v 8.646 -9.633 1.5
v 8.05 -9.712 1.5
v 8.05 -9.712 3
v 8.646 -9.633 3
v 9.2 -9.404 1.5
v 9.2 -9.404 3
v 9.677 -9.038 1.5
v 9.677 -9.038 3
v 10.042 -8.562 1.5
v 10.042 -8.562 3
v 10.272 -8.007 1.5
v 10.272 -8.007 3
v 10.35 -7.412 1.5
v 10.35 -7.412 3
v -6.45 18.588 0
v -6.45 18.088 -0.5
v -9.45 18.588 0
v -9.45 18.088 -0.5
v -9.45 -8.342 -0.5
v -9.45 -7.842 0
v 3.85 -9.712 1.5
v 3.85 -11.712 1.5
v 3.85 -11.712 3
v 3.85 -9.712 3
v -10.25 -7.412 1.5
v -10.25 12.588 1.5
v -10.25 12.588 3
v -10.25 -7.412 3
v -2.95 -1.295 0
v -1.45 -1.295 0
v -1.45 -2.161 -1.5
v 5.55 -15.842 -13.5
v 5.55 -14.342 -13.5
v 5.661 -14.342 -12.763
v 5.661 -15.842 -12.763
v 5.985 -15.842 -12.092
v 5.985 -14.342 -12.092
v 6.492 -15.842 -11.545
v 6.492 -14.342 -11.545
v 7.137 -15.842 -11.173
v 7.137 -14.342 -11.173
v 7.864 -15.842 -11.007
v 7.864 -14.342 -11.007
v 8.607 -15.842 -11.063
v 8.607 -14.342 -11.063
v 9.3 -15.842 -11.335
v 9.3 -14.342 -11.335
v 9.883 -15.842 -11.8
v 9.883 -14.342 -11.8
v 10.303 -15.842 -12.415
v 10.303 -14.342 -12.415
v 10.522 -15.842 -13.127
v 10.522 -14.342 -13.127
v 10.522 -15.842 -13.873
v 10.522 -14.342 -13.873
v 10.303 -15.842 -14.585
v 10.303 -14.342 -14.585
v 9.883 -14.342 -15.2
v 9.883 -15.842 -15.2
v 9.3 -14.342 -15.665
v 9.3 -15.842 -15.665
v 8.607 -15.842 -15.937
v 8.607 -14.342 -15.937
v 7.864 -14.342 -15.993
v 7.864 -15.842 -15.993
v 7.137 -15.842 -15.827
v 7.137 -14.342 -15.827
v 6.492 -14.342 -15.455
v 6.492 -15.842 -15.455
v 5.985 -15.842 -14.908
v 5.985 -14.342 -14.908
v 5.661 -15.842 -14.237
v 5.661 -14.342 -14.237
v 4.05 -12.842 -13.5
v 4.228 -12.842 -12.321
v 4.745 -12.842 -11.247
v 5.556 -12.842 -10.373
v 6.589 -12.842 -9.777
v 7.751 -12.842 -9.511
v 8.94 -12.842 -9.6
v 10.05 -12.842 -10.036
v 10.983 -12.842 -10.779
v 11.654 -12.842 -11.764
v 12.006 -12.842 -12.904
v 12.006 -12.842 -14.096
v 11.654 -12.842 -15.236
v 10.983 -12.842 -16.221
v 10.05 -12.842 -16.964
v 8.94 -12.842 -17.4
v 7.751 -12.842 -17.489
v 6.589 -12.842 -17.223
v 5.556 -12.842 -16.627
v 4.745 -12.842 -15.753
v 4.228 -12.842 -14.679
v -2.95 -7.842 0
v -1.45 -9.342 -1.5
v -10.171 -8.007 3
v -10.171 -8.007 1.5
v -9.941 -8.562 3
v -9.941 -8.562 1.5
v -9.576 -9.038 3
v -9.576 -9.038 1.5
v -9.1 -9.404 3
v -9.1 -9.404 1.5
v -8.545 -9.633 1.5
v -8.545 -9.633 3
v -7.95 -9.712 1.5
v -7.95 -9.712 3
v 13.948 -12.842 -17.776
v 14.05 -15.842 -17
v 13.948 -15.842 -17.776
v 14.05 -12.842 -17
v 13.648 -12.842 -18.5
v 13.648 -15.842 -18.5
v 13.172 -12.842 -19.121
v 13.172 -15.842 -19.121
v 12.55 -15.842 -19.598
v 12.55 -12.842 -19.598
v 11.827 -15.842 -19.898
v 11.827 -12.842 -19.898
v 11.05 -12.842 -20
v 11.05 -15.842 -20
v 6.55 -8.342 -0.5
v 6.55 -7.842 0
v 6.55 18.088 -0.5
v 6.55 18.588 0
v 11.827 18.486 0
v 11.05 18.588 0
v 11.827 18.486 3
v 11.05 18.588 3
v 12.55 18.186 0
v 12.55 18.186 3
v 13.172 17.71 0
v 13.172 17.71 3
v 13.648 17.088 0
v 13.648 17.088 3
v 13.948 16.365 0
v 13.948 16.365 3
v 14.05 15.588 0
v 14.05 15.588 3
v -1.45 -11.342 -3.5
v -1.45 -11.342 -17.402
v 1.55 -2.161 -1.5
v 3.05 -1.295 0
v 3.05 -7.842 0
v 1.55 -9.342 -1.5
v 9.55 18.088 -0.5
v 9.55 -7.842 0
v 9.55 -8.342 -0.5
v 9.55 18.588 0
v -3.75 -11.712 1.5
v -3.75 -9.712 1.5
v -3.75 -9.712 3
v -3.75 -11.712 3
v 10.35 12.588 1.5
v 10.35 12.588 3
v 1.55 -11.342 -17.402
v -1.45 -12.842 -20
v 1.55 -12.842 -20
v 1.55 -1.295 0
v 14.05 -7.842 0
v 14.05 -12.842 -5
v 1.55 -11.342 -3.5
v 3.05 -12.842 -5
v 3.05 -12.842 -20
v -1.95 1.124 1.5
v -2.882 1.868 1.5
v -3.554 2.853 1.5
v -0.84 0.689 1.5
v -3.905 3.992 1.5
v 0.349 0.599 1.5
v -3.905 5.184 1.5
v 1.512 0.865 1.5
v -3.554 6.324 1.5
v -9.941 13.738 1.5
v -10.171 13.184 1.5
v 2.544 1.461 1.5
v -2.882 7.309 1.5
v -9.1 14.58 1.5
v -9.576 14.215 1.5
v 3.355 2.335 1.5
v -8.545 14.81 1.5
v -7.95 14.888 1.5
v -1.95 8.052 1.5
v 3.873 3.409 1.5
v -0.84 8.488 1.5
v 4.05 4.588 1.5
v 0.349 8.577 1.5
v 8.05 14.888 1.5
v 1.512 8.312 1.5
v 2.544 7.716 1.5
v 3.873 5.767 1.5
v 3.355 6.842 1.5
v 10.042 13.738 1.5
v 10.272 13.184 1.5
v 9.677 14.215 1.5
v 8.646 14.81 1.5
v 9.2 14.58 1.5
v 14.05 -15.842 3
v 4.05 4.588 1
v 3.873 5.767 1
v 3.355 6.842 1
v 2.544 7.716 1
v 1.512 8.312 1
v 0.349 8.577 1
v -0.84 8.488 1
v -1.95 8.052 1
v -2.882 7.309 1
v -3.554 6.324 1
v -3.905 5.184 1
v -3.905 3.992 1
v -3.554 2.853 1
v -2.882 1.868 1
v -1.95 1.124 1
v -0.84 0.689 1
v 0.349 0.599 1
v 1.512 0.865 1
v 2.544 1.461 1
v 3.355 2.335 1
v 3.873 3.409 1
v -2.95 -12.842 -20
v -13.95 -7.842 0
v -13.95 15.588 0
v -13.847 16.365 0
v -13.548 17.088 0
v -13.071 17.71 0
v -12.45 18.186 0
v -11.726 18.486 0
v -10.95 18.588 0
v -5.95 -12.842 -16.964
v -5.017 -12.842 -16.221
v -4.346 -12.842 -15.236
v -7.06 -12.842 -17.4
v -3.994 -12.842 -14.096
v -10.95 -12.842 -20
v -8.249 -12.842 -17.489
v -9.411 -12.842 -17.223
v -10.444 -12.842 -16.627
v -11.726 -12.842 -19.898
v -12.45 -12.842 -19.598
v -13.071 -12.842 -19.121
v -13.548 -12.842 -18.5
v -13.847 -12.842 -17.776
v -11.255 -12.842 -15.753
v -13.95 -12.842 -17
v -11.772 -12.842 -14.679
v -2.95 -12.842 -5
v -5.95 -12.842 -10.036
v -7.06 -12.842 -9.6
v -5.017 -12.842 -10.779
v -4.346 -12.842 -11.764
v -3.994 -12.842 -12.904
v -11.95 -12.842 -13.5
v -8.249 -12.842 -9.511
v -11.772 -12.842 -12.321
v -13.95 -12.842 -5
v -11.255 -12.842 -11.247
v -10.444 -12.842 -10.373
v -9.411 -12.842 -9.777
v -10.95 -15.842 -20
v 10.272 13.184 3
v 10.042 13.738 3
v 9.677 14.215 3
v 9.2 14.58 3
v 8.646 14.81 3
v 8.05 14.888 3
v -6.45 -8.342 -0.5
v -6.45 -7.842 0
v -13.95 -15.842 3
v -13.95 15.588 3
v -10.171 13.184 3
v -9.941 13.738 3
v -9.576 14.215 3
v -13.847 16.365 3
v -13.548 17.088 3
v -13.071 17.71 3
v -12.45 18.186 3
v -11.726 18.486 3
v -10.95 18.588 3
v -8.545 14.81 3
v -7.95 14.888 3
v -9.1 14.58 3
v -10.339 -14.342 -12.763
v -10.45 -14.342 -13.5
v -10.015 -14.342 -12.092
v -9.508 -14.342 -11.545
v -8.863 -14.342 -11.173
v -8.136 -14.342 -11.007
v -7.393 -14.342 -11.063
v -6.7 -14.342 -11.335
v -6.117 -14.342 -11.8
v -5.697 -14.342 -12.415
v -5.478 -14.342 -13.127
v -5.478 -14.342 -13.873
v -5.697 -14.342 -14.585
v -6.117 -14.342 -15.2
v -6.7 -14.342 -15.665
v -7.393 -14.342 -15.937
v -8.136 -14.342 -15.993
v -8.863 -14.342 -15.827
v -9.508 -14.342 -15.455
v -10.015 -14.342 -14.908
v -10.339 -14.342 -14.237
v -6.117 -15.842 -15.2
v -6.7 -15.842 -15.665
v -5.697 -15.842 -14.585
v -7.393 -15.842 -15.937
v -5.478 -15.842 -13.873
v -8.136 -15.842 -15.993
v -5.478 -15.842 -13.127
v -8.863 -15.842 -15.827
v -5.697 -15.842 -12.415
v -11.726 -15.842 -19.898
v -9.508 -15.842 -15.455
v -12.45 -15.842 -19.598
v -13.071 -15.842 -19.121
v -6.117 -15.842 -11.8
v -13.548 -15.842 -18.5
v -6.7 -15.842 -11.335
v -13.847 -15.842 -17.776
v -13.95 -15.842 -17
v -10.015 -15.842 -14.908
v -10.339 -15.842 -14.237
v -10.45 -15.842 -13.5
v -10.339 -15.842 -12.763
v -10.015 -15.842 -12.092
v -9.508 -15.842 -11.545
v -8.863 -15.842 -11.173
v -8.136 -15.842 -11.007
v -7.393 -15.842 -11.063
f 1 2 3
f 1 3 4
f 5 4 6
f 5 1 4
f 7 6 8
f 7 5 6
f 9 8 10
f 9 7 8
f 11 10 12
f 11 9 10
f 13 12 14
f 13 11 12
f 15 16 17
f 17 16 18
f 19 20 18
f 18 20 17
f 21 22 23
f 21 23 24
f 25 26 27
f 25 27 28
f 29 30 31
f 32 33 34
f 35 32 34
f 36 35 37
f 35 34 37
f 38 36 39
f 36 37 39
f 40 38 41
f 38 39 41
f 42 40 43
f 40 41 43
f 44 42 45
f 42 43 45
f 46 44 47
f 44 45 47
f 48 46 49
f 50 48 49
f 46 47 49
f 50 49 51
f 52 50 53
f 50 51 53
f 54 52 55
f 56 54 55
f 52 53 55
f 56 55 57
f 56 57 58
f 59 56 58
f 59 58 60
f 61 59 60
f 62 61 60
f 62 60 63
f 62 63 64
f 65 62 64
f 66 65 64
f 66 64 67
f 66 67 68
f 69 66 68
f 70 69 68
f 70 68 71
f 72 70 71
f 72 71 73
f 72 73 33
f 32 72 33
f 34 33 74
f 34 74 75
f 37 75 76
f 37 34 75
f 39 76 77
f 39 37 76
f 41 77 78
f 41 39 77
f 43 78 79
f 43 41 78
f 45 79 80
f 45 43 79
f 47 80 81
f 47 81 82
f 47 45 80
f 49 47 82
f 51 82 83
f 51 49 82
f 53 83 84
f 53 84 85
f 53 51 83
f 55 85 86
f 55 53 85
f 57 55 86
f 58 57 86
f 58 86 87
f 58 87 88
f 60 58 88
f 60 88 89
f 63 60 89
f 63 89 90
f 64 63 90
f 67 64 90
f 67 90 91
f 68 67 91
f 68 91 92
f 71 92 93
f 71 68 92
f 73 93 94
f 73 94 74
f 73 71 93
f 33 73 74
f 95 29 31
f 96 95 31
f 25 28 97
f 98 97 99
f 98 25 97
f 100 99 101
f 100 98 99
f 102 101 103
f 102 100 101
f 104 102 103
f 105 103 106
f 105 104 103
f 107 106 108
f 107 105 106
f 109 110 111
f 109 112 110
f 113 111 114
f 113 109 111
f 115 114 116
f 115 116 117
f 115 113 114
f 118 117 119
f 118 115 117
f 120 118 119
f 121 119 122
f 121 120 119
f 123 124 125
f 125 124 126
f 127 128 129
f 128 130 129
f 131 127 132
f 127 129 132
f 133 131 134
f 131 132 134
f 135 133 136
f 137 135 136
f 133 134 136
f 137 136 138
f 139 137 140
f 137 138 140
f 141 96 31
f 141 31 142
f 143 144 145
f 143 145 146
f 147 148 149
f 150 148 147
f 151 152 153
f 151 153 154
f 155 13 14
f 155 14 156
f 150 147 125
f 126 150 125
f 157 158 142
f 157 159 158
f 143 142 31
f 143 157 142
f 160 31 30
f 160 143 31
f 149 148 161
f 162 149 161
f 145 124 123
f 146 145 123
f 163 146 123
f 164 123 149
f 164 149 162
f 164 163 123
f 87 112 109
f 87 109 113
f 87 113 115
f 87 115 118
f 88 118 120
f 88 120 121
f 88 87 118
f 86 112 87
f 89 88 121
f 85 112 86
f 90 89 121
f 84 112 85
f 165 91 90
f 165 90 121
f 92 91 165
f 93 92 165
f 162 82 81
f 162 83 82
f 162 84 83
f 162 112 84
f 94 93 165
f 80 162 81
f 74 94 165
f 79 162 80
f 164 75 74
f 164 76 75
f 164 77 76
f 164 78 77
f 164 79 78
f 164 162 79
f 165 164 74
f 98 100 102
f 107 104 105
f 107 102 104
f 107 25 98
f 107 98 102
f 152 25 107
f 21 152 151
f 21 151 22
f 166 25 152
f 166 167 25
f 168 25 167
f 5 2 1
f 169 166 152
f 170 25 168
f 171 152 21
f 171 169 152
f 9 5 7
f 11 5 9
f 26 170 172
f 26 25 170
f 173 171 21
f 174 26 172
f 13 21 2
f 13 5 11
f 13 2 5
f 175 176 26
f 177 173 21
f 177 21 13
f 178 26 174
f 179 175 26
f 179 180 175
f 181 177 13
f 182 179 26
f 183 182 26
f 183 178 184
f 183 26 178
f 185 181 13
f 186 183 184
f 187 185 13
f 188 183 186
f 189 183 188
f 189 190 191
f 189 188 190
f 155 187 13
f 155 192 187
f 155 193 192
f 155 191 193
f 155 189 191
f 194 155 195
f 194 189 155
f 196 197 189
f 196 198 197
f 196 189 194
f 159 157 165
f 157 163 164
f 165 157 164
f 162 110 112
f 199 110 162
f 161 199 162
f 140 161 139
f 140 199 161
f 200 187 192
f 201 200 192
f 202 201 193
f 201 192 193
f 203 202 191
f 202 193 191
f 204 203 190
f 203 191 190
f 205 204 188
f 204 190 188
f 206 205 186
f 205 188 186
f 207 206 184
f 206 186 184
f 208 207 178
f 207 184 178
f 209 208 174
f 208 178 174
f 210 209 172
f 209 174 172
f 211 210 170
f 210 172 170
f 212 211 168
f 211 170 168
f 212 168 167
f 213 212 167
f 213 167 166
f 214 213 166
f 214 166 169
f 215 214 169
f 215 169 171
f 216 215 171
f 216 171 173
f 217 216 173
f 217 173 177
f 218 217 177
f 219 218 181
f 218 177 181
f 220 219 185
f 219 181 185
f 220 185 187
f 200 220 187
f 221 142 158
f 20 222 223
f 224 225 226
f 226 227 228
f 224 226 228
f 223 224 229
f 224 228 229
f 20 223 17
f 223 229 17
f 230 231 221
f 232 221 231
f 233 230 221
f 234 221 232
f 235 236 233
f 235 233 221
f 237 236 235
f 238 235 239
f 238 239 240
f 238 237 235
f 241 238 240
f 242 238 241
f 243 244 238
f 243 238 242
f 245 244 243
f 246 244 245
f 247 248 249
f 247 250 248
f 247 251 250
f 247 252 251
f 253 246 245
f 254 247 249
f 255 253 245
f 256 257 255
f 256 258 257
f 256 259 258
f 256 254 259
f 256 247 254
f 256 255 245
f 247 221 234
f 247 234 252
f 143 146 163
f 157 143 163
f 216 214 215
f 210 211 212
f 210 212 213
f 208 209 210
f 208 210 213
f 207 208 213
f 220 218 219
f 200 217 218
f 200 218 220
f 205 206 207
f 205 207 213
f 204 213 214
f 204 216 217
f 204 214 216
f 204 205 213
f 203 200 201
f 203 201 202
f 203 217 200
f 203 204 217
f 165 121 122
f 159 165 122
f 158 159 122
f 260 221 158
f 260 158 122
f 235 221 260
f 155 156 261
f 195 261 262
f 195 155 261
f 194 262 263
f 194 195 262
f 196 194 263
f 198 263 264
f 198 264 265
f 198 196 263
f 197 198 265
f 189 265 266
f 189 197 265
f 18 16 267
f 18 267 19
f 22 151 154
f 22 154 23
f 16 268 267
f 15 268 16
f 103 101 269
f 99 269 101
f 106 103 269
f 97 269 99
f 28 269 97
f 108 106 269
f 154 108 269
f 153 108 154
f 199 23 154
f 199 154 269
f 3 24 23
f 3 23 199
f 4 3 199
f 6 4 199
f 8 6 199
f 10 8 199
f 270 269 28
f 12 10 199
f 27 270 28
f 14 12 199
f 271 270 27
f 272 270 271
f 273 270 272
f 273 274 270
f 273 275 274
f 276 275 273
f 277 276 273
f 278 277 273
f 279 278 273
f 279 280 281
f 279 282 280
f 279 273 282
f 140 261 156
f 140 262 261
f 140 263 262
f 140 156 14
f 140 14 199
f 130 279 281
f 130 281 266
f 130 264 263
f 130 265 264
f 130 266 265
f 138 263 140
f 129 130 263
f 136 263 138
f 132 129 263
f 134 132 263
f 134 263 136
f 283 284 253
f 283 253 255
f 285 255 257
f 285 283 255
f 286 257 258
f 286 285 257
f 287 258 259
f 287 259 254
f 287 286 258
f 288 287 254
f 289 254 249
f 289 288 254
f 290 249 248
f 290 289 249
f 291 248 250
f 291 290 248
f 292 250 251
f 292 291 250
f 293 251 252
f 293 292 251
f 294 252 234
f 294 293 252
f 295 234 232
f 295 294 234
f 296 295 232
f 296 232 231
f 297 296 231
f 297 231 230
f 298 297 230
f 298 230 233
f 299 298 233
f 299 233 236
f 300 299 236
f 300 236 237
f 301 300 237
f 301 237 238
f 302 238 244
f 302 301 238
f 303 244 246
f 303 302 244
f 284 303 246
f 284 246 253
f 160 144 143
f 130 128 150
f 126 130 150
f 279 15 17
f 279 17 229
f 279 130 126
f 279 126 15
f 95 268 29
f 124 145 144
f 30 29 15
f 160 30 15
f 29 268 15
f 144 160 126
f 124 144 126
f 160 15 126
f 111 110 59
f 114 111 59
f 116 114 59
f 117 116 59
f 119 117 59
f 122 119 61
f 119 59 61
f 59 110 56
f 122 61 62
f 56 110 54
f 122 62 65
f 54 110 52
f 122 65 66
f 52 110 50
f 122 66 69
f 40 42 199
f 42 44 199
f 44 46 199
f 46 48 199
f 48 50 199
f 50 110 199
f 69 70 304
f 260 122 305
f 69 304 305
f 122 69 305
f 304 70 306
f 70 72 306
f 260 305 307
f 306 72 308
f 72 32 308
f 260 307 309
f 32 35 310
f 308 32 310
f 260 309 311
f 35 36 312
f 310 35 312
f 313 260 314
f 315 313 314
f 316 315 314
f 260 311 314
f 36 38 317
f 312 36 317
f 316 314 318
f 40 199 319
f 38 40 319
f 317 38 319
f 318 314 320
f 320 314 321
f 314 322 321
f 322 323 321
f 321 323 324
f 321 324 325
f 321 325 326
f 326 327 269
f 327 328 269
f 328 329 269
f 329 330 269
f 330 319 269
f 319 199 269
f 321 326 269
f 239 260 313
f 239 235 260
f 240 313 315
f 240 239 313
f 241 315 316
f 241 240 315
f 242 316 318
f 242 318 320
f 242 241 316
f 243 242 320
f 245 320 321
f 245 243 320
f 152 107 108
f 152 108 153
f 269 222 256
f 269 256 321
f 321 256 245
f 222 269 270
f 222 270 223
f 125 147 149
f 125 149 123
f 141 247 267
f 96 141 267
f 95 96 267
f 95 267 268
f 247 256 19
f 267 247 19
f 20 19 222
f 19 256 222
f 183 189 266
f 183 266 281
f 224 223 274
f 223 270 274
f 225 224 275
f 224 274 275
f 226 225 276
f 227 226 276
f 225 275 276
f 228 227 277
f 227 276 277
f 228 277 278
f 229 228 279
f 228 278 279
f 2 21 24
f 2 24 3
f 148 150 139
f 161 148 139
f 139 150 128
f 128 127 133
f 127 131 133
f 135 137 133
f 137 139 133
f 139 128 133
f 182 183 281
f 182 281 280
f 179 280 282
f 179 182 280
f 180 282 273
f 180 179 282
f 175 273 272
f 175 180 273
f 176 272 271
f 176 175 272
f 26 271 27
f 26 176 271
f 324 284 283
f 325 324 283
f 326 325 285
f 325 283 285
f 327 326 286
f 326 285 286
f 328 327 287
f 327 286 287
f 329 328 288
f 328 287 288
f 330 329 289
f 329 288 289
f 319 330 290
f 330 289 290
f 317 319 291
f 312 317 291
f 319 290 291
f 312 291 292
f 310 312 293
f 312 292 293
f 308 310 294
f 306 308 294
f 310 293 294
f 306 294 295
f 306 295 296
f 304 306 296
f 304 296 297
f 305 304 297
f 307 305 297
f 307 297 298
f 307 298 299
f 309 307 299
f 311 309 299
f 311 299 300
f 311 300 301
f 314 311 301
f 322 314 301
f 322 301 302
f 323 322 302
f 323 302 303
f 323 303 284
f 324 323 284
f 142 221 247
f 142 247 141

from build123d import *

# Parameters (mm, degrees)
ESBO_O2_W                = 28
ESBO_O2_H                = 34.43
RESSALTO_EXTRUS_O1_DEPTH = 3
FILETE1_R                = 3
RESSALTO_EXTRUS_O2_START = -1.5
RESSALTO_EXTRUS_O2_DEPTH = 1.5
ESBO_O5_W                = 28
ESBO_O5_H                = 3
RESSALTO_EXTRUS_O3_DEPTH = 20
ESBO_O6_R                = 2.5
CORTE_EXTRUS_O1_DEPTH    = 10
FILETE2_R                = 3
RESSALTO_EXTRUS_O4_DEPTH = 1.5
CHANFRO1_SIZE            = 1.5
CHANFRO2_SIZE            = 1.5
ESBO_O8_R                = 4
CORTE_EXTRUS_O2_DEPTH    = 0.5
CHANFRO3_SIZE            = 5
ESBO_O9_W                = 3
ESBO_O9_H                = 31.43
RESSALTO_EXTRUS_O5_DEPTH = 0.5
CHANFRO4_SIZE            = 0.5


with BuildPart() as part:
    # Esboço2 → Ressalto-extrusão1 (new body)
    with BuildSketch(Plane.XY):
        with Locations((0.050363351, 1.373235294)):
            Rectangle(ESBO_O2_W, ESBO_O2_H)
        with BuildLine():
            Line((8.050363351, 14.888235294), (-7.949636649, 14.888235294))
            ThreePointArc((-7.949636649, 14.888235294), (-9.575982246, 14.214580891), (-10.249636649, 12.588235294))
            Line((-10.249636649, 12.588235294), (-10.249636649, -7.411764706))
            ThreePointArc((-10.249636649, -7.411764706), (-9.575982246, -9.038110303), (-7.949636649, -9.711764706))
            Line((-7.949636649, -9.711764706), (-3.749636649, -9.711764706))
            Line((-3.749636649, -9.711764706), (-3.749636649, -11.711764706))
            Line((-3.749636649, -11.711764706), (3.850363351, -11.711764706))
            Line((3.850363351, -11.711764706), (3.850363351, -9.711764706))
            Line((3.850363351, -9.711764706), (8.050363351, -9.711764706))
            ThreePointArc((8.050363351, -9.711764706), (9.676708947, -9.038110303), (10.350363351, -7.411764706))
            Line((10.350363351, -7.411764706), (10.350363351, 12.588235294))
            ThreePointArc((10.350363351, 12.588235294), (9.676708947, 14.214580891), (8.050363351, 14.888235294))
        make_face(mode=Mode.SUBTRACT)
    extrude(amount=RESSALTO_EXTRUS_O1_DEPTH)

    # Filete1
    filete1_edges = [part.edges().sort_by_distance(p)[0] for p in [
        (-13.949636649, 18.588235294, 1.5),
        (14.050363351, 18.588235294, 1.5),
    ]]
    fillet(filete1_edges, radius=FILETE1_R)

    # Esboço3 → Ressalto-extrusão2 (add)
    with BuildSketch(Plane(origin=(0, 0, 0), x_dir=(-1, 0, 0), z_dir=(0, 0, -1)).offset(RESSALTO_EXTRUS_O2_START)):
        with BuildLine():
            Line((13.949636649, 15.588235294), (13.949636649, -15.841764706))
            Line((13.949636649, -15.841764706), (-14.050363351, -15.841764706))
            Line((-14.050363351, -15.841764706), (-14.050363351, 15.588235294))
            ThreePointArc((-14.050363351, 15.588235294), (-13.171683694, 17.709555638), (-11.050363351, 18.588235294))
            Line((-11.050363351, 18.588235294), (10.949636649, 18.588235294))
            ThreePointArc((10.949636649, 18.588235294), (13.070956993, 17.709555638), (13.949636649, 15.588235294))
        make_face()
    extrude(amount=RESSALTO_EXTRUS_O2_DEPTH)

    # Esboço5 → Ressalto-extrusão3 (add)
    with BuildSketch(Plane(origin=(0, 0, 0), x_dir=(-1, 0, 0), z_dir=(0, 0, -1))):
        with Locations((-0.050363351, -14.341764706)):
            Rectangle(ESBO_O5_W, ESBO_O5_H)
    extrude(amount=RESSALTO_EXTRUS_O3_DEPTH)

    # Esboço6 → Corte-extrusão1 (cut)
    with BuildSketch(Plane(origin=(0, -12.841764706, 0), x_dir=(1, 0, 0), z_dir=(0, 1, 0))):
        with Locations(Location((-7.949636649, 13.5, 0), (0, 0, 180))):
            Circle(ESBO_O6_R)
        with Locations(Location((8.050363351, 13.5, 0), (0, 0, 180))):
            Circle(ESBO_O6_R)
    extrude(amount=-CORTE_EXTRUS_O1_DEPTH, mode=Mode.SUBTRACT)

    # Filete2
    filete2_edges = [part.edges().sort_by_distance(p)[0] for p in [
        (14.050363351, -14.341764706, -20),
        (-13.949636649, -14.341764706, -20),
    ]]
    fillet(filete2_edges, radius=FILETE2_R)

    # Esboço7 → Ressalto-extrusão4 (add, symmetric)
    with BuildSketch(Plane(origin=(0.050363351, 0, 0), x_dir=(0, 0, -1), z_dir=(1, 0, 0))):
        Polygon((0, -1.294759322), (0, -12.841764706), (20, -12.841764706), align=None)
    extrude(amount=RESSALTO_EXTRUS_O4_DEPTH, both=True)

    # Chanfro1
    # the kernel refuses this chamfer: 1.5 mm, written as the material it adds along each edge
    with BuildSketch(Plane(origin=(-1.449636649, -12.841764706, 3.857524482), x_dir=(-0.9996219169112968, -0.027495876610586813, 0), z_dir=(0, 0, -1))) as chanfro1_piece_1_section:
        Polygon((CHANFRO1_SIZE * 0.999621916911, CHANFRO1_SIZE * 0.0274958766106), (-CHANFRO1_SIZE * 0.0274958766106, CHANFRO1_SIZE * 0.999621916911), (0, 0), align=None)
    chanfro1_piece_1 = extrude(amount=27.715048964, mode=Mode.PRIVATE)
    chanfro1_piece_1 = split(chanfro1_piece_1, bisect_by=Plane(origin=(-1.978250847, -8.234905434, -12.020685678), z_dir=(0, -0.8660254037844417, 0.4999999999999947)), keep=Keep.TOP, mode=Mode.PRIVATE)
    chanfro1_piece_1 = split(chanfro1_piece_1, bisect_by=Plane(origin=(-1.978250847, -12.398993102, 1.5), z_dir=(0, 0, -1)), keep=Keep.TOP, mode=Mode.PRIVATE)
    add(chanfro1_piece_1)
    with BuildSketch(Plane(origin=(-1.449636649, 2.56276516, 0), x_dir=(-0.9996219169112969, 0, 0.027495876610586372), z_dir=(0, -1, 0))) as chanfro1_piece_2_section:
        Polygon((CHANFRO1_SIZE * 0.999621916911, CHANFRO1_SIZE * 0.0274958766106), (-CHANFRO1_SIZE * 0.0274958766106, CHANFRO1_SIZE * 0.999621916911), (0, 0), align=None)
    chanfro1_piece_2 = extrude(amount=19.262054348, mode=Mode.PRIVATE)
    chanfro1_piece_2 = split(chanfro1_piece_2, bisect_by=Plane(origin=(-1.952841778, -15.841764706, -0.493589744), z_dir=(0, 1, 0)), keep=Keep.TOP, mode=Mode.PRIVATE)
    chanfro1_piece_2 = split(chanfro1_piece_2, bisect_by=Plane(origin=(-1.952841778, -2.987487395, -2.931891026), z_dir=(0, -0.8660254037844417, 0.4999999999999947)), keep=Keep.TOP, mode=Mode.PRIVATE)
    add(chanfro1_piece_2)
    with BuildSketch(Plane(origin=(1.550363351, -12.841764706, 3.857524482), x_dir=(-0.02749587661058648, 0.9996219169112968, 0), z_dir=(0, 0, -1))) as chanfro1_piece_3_section:
        Polygon((CHANFRO1_SIZE * 0.999621916911, CHANFRO1_SIZE * 0.0274958766106), (-CHANFRO1_SIZE * 0.0274958766106, CHANFRO1_SIZE * 0.999621916911), (0, 0), align=None)
    chanfro1_piece_3 = extrude(amount=27.715048964, mode=Mode.PRIVATE)
    chanfro1_piece_3 = split(chanfro1_piece_3, bisect_by=Plane(origin=(1.674066113, -7.728766139, -11.144026704), z_dir=(0, -0.8660254037844417, 0.4999999999999947)), keep=Keep.TOP, mode=Mode.PRIVATE)
    chanfro1_piece_3 = split(chanfro1_piece_3, bisect_by=Plane(origin=(1.674066113, -11.58917023, 1.5), z_dir=(0, 0, -1)), keep=Keep.TOP, mode=Mode.PRIVATE)
    add(chanfro1_piece_3)
    with BuildSketch(Plane(origin=(1.550363351, 2.56276516, 0), x_dir=(0.9996219169112969, 0, 0.027495876610586372), z_dir=(0, -1, 0))) as chanfro1_piece_4_section:
        Polygon((CHANFRO1_SIZE * 0.999621916911, -CHANFRO1_SIZE * 0.0274958766106), (-CHANFRO1_SIZE * 0.0274958766106, -CHANFRO1_SIZE * 0.999621916911), (0, 0), align=None)
    chanfro1_piece_4 = extrude(amount=15.404529866, mode=Mode.PRIVATE)
    chanfro1_piece_4 = split(chanfro1_piece_4, bisect_by=Plane(origin=(2.053568479, -2.987487395, -2.931891026), z_dir=(0, -0.8660254037844417, 0.4999999999999947)), keep=Keep.TOP, mode=Mode.PRIVATE)
    add(chanfro1_piece_4)

    # Chanfro2
    chanfro2_edges = [part.edges().sort_by_distance(p)[0] for p in [
        (-5.449636649, -12.841764706, -13.5),
        (10.550363351, -12.841764706, -13.5),
    ]]
    chamfer(chanfro2_edges, length=CHANFRO2_SIZE)

    # Esboço8 → Corte-extrusão2 (cut)
    with BuildSketch(Plane.XY.offset(1.5)):
        with Locations((0.050363351, 4.588235294)):
            Circle(ESBO_O8_R)
    extrude(amount=-CORTE_EXTRUS_O2_DEPTH, mode=Mode.SUBTRACT)

    # Chanfro3
    # the kernel refuses this chamfer: 5 mm, written as the material it adds along each edge
    with BuildSketch(Plane(origin=(-13.949636649, -12.841764706, 0), x_dir=(0, -0.027495876610586317, -0.9996219169112968), z_dir=(1, 0, 0))) as chanfro3_piece_1:
        Polygon((CHANFRO3_SIZE * 0.999621916911, CHANFRO3_SIZE * 0.0274958766106), (-CHANFRO3_SIZE * 0.0274958766106, CHANFRO3_SIZE * 0.999621916911), (0, 0), align=None)
    extrude(amount=23.85841494)
    with BuildSketch(Plane(origin=(-9.808051589, -12.841764706, 0), x_dir=(0, 0.9996219169112968, 0.027495876610586372), z_dir=(1, 0, 0))) as chanfro3_piece_2:
        Polygon((CHANFRO3_SIZE * 0.999621916911, -CHANFRO3_SIZE * 0.0274958766106), (-CHANFRO3_SIZE * 0.0274958766106, -CHANFRO3_SIZE * 0.999621916911), (0, 0), align=None)
    extrude(amount=23.85841494)

    # Esboço9 → Ressalto-extrusão5 (add)
    with BuildSketch(Plane(origin=(0, 0, 0), x_dir=(-1, 0, 0), z_dir=(0, 0, -1))):
        with Locations((-8.050363351, 2.873235294)):
            Rectangle(ESBO_O9_W, ESBO_O9_H)
        with Locations((7.949636649, 2.873235294)):
            Rectangle(ESBO_O9_W, ESBO_O9_H)
    extrude(amount=RESSALTO_EXTRUS_O5_DEPTH)

    # Chanfro4
    chanfro4_edges = [part.edges().sort_by_distance(p)[0] for p in [
        (-7.949636649, 18.588235294, -0.5),
        (8.050363351, 18.588235294, -0.5),
    ]]
    chamfer(chanfro4_edges, length=CHANFRO4_SIZE)


solid = part.part
